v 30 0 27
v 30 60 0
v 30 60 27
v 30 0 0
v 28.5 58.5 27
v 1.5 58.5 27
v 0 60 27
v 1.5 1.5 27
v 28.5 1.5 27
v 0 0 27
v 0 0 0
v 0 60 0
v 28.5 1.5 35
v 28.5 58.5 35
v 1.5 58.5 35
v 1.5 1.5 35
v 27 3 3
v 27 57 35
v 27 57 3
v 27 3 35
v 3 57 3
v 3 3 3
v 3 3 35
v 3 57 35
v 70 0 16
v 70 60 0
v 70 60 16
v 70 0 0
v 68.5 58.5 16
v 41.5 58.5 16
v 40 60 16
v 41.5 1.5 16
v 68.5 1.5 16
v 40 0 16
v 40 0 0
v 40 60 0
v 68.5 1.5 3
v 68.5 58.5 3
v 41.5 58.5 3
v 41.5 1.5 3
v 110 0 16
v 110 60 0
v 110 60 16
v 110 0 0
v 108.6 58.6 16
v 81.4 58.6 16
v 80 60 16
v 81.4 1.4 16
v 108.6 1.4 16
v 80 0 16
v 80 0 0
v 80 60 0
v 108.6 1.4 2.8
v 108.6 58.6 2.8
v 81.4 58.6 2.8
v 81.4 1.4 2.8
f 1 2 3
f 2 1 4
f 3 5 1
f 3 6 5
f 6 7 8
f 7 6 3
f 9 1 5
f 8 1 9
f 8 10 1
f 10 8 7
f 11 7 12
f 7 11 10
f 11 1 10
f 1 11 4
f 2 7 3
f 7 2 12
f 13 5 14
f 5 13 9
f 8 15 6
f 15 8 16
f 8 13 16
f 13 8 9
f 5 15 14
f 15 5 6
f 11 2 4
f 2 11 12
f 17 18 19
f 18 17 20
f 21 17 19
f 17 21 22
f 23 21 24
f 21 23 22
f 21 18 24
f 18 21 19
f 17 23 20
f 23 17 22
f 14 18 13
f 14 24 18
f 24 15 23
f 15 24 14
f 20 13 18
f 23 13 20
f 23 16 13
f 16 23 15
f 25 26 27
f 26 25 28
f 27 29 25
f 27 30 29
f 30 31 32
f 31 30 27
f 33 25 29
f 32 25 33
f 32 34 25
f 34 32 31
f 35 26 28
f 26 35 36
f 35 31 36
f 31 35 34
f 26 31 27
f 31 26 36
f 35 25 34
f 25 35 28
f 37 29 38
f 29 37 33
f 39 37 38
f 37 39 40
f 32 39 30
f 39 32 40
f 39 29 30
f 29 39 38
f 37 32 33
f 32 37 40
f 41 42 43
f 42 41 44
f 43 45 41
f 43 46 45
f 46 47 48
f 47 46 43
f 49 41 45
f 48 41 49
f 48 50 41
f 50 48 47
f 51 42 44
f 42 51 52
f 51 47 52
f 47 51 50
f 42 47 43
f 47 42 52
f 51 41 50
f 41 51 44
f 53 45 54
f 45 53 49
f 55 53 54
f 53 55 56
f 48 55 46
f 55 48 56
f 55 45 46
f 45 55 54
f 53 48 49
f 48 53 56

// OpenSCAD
function dimensionCalc(x, y, z, mt, lid_pct, lid_overlap_pct) = 
	// height of lower box, interior x, interior y
	[z*(1-lid_pct*lid_overlap_pct), (x-2*mt), (y-2*mt)];

module cardBoxLid(x,y,z,mt,lid_pct){
	difference(){
		cube([x,y,z*lid_pct]);
		translate([(mt)/2,(mt)/2,mt])
			cube([x-mt,y-mt,z*lid_pct - mt]);
	}
}

module cardBoxSpacedLid(x,y,z,mt,lid_pct){
	side_spacing = .2; // mm to allow for actually getting the lid off
	difference(){
		cardBoxLid(x,y,z,mt,lid_pct);
		translate([(mt-side_spacing)/2,(mt-side_spacing)/2,mt-side_spacing])
			cube([x-(mt-side_spacing),y-(mt-side_spacing),z*lid_pct - (mt-side_spacing)]);
	}
}

module cardBoxInsertSlot(ix,h,mt){
	union(){
		translate([mt,0,0])
		union(){
			cube([mt/2,mt/2,h]);
			translate([0,mt,0])
				cube([mt/2,mt/2,h]);
		}
		
		translate([ix+mt/2,0,0])
		union(){
			cube([mt/2,mt/2,h]);
			translate([0,mt,0])
				cube([mt/2,mt/2,h]);
		}
	}
}

module cardBox(x,y,z,mt,lid_pct,lid_overlap_pct,slot_list){
	l = dimensionCalc(x,y,z,mt,lid_pct,lid_overlap_pct);
	h = l[0];
	ix = l[1];
	iy = l[2];
	difference(){
		cube([x,y,z]);
		translate([mt,mt,mt])
			cube([ix, iy, z]);
		rotate([180,0,0])
			translate([0,-y,-z-mt])
			cardBoxLid(x,y,z,mt,lid_pct);
		translate([0,0,h+mt])
			cube([x,y,lid_pct*lid_overlap_pct*z-mt]);
	}

	for (i = slot_list)
		color("purple")
			// adjust to put the min-max slots at the very edges of the interior
			translate([0,mt+(iy-5/2*mt)*i,mt])
			cardBoxInsertSlot(ix,h,mt);
}

module cardBoxDivider(x,y,z,mt,lid_pct,lid_overlap_pct){
	l = dimensionCalc(x,y,z,mt,lid_pct,lid_overlap_pct);
	h = l[0];
	ix = l[1];
	iy = l[2];
	difference(){
		union(){
			translate([ix/6,mt/2,h/2])
			rotate([90,0,0])
			linear_extrude(mt/2)
			resize([ix/3,h])
			circle(1);

			translate([ix*5/6,mt/2,h/2])
			rotate([90,0,0])
			linear_extrude(mt/2)
			resize([ix*2/6,h])
			circle(1);

			cube([ix*1/6,mt/2,h]);

			translate([ix*1/3,0,0])
			cube([ix*2/6,mt/2,h/2]);

			translate([ix*5/6,0,0])
			cube([ix*1/6,mt/2,h]);

			cube([ix,mt/2,h/2]);
		}

		translate([ix*3/6,mt/2,h/2])
		rotate([90,0,0])
		linear_extrude(mt/2)
		resize([ix*2/6,ix*2/6])
		circle(1);
	}
}


l_x=30;
w_y=60;
h_z=40;
mt=3;
lid_pct = .4;
overlap = .5;
$fn = 100;
eps=.0001;
dividers=[0,.5,1];

// box
cardBox(l_x,w_y,h_z,mt,lid_pct,overlap,[]);

// lid
color("red")
	translate([40,0,0])
	cardBoxLid(l_x,w_y,h_z,mt,lid_pct);

color("green")
	translate([80,0,0])
	cardBoxSpacedLid(l_x,w_y,h_z,mt,lid_pct);

// dividers
//color("yellow")
//	translate([-l_x-mt,0,0])
//	cardBoxDivider(l_x,w_y,h_z,mt,lid_pct,overlap);

//color("green")
//	translate([mt,(w_y)*.5-mt/4,mt])
//	cardBoxDivider(l_x,w_y,h_z,mt,lid_pct,overlap);
